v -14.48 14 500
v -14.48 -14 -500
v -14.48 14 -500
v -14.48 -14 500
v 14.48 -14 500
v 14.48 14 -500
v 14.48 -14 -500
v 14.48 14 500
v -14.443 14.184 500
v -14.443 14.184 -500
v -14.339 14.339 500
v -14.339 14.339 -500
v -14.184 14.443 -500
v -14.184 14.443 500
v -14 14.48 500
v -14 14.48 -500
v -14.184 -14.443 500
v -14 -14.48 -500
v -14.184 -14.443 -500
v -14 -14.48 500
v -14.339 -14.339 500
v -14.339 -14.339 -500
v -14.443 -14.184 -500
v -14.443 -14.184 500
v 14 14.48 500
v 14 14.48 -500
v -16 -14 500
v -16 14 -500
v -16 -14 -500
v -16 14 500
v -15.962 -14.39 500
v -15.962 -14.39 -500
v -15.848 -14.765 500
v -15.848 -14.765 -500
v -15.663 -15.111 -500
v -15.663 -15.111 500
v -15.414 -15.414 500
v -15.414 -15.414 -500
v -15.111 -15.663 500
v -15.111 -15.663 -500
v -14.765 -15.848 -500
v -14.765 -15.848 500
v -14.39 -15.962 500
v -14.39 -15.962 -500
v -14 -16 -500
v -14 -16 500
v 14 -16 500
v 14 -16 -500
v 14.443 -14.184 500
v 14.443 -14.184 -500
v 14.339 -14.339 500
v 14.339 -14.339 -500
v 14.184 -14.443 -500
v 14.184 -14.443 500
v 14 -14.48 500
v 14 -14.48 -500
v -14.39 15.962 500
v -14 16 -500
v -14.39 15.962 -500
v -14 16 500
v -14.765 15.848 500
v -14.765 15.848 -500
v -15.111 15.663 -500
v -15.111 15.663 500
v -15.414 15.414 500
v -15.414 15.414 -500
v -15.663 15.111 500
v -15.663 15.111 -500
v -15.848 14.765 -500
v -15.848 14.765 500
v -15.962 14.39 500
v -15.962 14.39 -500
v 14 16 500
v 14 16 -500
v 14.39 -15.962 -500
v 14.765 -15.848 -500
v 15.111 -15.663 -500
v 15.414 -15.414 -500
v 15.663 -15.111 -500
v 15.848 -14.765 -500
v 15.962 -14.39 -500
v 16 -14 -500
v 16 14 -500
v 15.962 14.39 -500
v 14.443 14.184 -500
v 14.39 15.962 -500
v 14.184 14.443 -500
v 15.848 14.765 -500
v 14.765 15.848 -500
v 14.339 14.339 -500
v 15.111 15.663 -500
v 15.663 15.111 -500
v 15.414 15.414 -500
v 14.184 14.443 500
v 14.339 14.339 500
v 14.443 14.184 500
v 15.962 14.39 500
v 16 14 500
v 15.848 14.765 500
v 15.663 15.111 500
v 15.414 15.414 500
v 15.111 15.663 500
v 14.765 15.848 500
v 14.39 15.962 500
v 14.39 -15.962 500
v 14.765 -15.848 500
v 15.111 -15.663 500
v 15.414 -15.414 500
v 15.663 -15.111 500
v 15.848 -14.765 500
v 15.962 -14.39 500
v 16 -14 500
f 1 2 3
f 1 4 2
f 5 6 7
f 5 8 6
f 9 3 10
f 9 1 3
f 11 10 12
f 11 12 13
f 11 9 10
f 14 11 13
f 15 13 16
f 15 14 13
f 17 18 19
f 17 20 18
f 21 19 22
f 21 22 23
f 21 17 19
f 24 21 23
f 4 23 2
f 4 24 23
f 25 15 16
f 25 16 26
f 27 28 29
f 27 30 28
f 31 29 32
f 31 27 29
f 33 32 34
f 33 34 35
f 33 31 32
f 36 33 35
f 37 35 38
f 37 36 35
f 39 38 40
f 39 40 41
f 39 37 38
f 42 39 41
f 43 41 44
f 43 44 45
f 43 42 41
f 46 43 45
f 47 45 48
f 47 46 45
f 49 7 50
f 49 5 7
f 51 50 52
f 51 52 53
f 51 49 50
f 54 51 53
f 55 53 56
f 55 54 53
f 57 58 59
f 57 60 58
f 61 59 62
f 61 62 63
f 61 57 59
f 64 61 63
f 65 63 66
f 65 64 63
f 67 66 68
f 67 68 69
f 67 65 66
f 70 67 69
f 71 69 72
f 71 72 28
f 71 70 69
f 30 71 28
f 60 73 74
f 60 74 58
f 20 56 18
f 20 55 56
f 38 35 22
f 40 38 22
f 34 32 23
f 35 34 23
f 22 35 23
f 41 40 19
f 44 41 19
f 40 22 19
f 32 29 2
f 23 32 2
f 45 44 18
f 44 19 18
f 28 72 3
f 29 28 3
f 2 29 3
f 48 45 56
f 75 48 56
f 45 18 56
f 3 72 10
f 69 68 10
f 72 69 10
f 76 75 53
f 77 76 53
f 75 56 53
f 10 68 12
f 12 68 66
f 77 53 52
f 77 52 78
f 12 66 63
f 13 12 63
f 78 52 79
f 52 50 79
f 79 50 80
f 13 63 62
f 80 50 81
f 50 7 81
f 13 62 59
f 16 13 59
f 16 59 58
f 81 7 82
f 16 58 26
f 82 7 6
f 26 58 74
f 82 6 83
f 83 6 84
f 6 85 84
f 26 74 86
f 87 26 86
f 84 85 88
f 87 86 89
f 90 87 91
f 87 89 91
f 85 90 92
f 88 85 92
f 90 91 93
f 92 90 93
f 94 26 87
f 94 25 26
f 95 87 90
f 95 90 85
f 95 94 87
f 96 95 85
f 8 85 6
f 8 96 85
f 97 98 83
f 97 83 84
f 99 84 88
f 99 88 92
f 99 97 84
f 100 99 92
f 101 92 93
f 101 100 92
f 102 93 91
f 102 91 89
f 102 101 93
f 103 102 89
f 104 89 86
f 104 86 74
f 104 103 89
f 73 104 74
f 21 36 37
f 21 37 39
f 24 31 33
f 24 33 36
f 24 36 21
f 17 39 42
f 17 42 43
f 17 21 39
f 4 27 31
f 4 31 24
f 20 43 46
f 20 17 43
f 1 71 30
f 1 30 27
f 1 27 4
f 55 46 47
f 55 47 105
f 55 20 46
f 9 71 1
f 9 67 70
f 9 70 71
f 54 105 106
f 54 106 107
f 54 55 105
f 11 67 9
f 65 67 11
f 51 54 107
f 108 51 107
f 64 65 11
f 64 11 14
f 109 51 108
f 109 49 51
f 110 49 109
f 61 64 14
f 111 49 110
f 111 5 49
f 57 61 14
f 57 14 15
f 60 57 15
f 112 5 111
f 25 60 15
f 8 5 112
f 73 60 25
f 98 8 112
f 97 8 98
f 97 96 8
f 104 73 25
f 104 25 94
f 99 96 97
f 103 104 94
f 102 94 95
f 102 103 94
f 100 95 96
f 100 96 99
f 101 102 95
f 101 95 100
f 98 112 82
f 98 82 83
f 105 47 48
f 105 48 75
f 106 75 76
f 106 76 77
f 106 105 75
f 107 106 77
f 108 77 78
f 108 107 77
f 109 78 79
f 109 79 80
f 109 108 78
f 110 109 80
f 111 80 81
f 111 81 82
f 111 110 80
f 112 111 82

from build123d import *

# Parameters (mm, degrees)
BOSS_EXTRUDE1_DEPTH      = 500
BOSS_EXTRUDE1_DEPTH_BACK = 500


with BuildPart() as part:
    # Sketch1 → Boss-Extrude1 (new body, two sides)
    with BuildSketch(Plane.XY) as boss_extrude1_sk:
        with BuildLine():
            Line((-14, -16), (14, -16))
            ThreePointArc((14, -16), (15.414213562, -15.414213562), (16, -14))
            Line((16, -14), (16, 14))
            ThreePointArc((16, 14), (15.414213562, 15.414213562), (14, 16))
            Line((14, 16), (-14, 16))
            ThreePointArc((-14, 16), (-15.414213562, 15.414213562), (-16, 14))
            Line((-16, 14), (-16, -14))
            ThreePointArc((-16, -14), (-15.414213562, -15.414213562), (-14, -16))
        make_face()
        with BuildLine():
            Line((-14, 14.48), (14, 14.48))
            ThreePointArc((14, 14.48), (14.339411255, 14.339411255), (14.48, 14))
            Line((14.48, 14), (14.48, -14))
            ThreePointArc((14.48, -14), (14.339411255, -14.339411255), (14, -14.48))
            Line((14, -14.48), (-14, -14.48))
            ThreePointArc((-14, -14.48), (-14.339411255, -14.339411255), (-14.48, -14))
            Line((-14.48, -14), (-14.48, 14))
            ThreePointArc((-14.48, 14), (-14.339411255, 14.339411255), (-14, 14.48))
        make_face(mode=Mode.SUBTRACT)
    extrude(amount=BOSS_EXTRUDE1_DEPTH)
    extrude(boss_extrude1_sk.sketch, amount=-BOSS_EXTRUDE1_DEPTH_BACK)


solid = part.part
